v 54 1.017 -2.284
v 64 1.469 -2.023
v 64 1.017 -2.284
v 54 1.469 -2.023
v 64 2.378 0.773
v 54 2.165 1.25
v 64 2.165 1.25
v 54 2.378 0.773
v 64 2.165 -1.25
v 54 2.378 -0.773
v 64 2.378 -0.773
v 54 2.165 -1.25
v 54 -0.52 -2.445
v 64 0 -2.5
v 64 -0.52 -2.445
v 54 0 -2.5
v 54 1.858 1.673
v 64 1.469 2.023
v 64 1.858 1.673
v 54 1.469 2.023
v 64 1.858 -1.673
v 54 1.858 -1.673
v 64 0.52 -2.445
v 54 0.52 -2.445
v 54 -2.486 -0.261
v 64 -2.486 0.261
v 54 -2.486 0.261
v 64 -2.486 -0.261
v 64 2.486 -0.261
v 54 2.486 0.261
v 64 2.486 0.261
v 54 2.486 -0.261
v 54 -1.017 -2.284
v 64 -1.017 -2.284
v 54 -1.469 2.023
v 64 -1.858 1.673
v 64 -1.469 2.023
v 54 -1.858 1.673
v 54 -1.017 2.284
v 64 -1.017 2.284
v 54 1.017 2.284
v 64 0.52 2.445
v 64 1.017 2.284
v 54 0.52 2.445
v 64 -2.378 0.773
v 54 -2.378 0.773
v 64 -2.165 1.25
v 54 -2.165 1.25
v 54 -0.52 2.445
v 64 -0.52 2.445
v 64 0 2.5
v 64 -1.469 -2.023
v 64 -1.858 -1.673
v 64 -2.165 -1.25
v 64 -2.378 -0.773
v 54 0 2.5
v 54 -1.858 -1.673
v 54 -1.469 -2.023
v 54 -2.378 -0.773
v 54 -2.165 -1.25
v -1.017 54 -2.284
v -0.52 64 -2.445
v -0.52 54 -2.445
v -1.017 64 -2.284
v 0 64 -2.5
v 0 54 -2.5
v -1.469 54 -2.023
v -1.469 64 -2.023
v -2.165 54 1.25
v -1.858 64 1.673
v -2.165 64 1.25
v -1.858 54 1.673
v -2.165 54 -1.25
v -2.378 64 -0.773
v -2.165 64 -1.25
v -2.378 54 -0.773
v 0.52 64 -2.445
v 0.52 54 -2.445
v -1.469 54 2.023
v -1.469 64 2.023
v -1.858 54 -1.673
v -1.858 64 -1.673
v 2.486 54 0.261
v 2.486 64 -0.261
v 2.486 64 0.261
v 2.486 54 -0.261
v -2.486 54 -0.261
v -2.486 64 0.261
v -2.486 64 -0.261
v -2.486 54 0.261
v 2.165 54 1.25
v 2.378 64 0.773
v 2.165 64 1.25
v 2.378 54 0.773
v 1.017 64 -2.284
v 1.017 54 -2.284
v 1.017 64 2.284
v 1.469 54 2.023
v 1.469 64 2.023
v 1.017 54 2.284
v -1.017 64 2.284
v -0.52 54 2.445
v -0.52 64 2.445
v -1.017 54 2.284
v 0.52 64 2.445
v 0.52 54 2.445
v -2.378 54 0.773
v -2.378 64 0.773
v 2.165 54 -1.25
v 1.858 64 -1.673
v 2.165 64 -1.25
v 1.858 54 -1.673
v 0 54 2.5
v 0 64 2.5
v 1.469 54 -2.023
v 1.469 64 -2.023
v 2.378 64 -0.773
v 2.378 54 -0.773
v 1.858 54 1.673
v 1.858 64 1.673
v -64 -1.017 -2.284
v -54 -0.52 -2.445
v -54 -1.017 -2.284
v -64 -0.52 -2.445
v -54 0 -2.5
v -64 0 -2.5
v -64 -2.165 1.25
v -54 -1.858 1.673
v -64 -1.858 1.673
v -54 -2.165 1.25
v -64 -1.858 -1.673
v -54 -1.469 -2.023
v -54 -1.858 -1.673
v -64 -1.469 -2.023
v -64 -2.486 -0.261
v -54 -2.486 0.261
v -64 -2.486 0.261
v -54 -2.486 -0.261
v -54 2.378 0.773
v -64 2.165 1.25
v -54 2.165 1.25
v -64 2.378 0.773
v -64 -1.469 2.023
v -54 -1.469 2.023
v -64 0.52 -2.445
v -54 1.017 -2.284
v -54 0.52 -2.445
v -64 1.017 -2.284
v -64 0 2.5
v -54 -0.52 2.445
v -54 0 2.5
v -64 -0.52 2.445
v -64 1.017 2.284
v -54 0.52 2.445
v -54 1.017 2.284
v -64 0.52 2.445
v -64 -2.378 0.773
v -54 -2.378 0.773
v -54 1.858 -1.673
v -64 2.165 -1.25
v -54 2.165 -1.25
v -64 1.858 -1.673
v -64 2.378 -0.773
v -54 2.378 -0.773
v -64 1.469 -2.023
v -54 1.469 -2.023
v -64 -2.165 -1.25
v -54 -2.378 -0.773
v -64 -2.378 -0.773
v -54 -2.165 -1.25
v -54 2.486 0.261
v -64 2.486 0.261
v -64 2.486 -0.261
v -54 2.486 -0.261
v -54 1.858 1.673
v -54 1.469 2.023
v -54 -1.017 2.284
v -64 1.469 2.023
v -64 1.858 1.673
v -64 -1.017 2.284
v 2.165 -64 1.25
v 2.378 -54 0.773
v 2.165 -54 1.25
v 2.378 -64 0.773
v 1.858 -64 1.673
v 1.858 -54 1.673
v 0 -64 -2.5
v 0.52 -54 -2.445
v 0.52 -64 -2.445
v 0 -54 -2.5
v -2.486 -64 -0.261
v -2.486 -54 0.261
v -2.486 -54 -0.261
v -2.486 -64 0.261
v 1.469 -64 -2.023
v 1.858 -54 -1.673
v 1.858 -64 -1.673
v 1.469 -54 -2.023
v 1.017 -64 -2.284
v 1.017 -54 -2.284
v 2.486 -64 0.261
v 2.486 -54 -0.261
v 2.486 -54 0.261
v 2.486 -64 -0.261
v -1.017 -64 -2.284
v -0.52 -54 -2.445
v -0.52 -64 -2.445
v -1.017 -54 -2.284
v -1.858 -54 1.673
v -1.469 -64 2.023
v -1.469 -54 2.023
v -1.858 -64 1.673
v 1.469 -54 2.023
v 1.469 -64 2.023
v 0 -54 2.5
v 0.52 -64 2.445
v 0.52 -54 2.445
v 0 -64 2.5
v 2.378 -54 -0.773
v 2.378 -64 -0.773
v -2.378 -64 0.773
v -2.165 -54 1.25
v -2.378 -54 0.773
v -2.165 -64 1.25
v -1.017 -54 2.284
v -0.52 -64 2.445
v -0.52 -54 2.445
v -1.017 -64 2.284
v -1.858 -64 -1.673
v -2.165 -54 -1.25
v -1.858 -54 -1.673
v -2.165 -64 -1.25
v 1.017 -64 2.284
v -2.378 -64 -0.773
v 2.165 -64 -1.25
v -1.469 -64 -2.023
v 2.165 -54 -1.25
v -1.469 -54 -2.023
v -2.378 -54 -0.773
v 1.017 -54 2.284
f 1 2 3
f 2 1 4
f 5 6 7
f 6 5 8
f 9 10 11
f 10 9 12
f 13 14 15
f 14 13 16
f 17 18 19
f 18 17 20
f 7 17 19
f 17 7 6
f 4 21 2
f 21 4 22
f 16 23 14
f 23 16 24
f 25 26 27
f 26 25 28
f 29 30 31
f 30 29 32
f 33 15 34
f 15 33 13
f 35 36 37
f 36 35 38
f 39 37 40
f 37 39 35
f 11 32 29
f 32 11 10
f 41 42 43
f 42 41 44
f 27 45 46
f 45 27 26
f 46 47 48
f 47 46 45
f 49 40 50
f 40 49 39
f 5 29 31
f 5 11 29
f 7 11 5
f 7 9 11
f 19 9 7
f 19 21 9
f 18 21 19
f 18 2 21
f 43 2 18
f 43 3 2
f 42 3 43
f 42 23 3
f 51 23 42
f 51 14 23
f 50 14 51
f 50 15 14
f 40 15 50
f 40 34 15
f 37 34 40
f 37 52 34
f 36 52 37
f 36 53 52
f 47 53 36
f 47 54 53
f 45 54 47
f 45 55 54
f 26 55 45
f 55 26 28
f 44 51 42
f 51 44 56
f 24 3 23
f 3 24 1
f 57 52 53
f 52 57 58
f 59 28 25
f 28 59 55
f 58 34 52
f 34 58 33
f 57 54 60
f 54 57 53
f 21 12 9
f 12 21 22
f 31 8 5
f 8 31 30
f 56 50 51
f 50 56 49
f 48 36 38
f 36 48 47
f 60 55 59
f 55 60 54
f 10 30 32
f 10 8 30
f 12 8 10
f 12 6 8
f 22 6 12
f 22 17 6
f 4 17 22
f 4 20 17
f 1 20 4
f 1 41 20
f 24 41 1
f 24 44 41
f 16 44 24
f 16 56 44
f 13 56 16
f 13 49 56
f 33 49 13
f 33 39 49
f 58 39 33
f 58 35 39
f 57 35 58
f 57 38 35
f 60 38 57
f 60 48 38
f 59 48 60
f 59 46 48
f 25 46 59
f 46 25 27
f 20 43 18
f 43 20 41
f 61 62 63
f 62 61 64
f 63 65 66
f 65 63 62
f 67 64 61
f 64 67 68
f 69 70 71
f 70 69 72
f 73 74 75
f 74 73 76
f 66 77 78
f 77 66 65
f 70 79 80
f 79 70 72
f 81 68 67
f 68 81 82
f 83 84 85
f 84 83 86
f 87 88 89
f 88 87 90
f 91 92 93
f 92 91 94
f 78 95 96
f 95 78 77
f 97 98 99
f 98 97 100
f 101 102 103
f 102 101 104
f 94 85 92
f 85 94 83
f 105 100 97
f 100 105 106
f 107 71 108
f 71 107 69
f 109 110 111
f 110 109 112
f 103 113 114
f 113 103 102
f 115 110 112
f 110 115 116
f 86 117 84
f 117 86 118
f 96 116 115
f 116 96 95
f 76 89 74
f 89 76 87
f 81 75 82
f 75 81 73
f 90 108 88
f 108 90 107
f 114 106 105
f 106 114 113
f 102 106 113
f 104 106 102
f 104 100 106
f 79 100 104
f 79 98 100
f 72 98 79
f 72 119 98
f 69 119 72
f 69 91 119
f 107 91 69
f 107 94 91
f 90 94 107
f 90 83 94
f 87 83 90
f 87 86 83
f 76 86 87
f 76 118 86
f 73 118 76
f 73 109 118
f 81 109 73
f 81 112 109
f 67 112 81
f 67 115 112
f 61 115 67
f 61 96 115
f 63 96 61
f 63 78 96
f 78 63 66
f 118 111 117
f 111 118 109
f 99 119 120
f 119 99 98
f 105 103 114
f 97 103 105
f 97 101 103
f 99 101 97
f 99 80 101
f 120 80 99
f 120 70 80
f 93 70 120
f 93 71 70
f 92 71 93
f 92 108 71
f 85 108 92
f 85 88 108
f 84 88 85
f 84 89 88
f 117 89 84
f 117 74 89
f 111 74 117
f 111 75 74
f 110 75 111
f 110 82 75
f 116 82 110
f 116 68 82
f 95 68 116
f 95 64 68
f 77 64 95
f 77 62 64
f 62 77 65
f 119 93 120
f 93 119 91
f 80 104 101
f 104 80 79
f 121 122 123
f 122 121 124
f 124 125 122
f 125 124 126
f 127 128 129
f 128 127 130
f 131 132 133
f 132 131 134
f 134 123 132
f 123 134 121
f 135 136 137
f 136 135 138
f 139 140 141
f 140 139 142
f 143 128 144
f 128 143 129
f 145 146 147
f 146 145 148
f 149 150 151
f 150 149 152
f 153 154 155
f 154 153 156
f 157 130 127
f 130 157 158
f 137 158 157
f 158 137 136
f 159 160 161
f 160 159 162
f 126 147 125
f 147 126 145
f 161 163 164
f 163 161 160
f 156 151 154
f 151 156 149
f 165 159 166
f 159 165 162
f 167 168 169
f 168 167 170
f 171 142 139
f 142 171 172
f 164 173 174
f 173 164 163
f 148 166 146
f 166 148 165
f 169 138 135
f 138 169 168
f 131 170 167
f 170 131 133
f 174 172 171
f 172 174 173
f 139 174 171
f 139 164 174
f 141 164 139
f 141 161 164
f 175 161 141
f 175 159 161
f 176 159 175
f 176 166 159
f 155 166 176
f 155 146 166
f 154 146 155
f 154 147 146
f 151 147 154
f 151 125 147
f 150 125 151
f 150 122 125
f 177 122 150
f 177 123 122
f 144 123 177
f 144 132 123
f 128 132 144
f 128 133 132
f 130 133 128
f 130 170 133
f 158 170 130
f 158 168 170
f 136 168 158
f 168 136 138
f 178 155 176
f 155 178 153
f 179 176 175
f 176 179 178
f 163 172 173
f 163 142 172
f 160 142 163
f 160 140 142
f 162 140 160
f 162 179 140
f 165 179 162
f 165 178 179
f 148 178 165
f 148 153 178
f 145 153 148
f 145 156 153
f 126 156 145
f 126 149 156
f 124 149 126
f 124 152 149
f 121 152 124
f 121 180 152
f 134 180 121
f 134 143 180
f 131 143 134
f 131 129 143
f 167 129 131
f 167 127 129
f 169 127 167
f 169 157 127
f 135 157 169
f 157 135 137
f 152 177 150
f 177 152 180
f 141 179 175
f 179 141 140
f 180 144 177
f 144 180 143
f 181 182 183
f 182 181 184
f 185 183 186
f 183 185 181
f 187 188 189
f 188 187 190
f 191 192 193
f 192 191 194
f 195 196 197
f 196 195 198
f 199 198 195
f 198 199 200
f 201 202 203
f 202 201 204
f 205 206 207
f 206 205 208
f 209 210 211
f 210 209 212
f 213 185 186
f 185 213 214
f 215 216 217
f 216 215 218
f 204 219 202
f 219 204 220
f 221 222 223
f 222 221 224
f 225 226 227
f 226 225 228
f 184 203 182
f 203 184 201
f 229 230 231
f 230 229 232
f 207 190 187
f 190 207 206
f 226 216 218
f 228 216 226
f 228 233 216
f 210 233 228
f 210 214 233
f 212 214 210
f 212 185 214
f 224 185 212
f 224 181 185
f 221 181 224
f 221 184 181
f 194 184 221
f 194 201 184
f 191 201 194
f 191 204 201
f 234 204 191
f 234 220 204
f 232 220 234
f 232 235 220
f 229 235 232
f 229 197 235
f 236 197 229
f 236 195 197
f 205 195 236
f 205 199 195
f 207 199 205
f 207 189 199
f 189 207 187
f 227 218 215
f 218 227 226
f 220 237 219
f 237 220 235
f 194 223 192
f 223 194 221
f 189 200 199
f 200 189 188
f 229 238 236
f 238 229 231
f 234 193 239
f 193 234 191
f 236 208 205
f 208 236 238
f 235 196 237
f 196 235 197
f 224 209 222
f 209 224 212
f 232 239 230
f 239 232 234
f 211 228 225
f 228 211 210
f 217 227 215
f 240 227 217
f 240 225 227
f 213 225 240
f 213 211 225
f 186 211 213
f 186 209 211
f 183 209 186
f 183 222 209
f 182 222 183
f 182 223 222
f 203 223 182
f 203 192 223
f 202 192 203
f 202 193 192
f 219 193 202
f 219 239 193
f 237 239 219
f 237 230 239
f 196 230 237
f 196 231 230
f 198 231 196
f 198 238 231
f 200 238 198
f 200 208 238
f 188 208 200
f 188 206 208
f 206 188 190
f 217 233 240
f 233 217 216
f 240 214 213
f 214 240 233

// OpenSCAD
module inset(inset_d=5){
    rotate(90, [0,1,0])
    cylinder(10, d=inset_d, $fn=30);
}
module inset_series( radius=54, n=4, inset_d=5 ){
    for(i=[0:1:n]){
        rotate(i*360/n, [0,0,1])
        translate( [radius, 0 ,0 ] ) inset(inset_d);
    }
}
inset_series( radius=54, n=4, inset_d=5 );
